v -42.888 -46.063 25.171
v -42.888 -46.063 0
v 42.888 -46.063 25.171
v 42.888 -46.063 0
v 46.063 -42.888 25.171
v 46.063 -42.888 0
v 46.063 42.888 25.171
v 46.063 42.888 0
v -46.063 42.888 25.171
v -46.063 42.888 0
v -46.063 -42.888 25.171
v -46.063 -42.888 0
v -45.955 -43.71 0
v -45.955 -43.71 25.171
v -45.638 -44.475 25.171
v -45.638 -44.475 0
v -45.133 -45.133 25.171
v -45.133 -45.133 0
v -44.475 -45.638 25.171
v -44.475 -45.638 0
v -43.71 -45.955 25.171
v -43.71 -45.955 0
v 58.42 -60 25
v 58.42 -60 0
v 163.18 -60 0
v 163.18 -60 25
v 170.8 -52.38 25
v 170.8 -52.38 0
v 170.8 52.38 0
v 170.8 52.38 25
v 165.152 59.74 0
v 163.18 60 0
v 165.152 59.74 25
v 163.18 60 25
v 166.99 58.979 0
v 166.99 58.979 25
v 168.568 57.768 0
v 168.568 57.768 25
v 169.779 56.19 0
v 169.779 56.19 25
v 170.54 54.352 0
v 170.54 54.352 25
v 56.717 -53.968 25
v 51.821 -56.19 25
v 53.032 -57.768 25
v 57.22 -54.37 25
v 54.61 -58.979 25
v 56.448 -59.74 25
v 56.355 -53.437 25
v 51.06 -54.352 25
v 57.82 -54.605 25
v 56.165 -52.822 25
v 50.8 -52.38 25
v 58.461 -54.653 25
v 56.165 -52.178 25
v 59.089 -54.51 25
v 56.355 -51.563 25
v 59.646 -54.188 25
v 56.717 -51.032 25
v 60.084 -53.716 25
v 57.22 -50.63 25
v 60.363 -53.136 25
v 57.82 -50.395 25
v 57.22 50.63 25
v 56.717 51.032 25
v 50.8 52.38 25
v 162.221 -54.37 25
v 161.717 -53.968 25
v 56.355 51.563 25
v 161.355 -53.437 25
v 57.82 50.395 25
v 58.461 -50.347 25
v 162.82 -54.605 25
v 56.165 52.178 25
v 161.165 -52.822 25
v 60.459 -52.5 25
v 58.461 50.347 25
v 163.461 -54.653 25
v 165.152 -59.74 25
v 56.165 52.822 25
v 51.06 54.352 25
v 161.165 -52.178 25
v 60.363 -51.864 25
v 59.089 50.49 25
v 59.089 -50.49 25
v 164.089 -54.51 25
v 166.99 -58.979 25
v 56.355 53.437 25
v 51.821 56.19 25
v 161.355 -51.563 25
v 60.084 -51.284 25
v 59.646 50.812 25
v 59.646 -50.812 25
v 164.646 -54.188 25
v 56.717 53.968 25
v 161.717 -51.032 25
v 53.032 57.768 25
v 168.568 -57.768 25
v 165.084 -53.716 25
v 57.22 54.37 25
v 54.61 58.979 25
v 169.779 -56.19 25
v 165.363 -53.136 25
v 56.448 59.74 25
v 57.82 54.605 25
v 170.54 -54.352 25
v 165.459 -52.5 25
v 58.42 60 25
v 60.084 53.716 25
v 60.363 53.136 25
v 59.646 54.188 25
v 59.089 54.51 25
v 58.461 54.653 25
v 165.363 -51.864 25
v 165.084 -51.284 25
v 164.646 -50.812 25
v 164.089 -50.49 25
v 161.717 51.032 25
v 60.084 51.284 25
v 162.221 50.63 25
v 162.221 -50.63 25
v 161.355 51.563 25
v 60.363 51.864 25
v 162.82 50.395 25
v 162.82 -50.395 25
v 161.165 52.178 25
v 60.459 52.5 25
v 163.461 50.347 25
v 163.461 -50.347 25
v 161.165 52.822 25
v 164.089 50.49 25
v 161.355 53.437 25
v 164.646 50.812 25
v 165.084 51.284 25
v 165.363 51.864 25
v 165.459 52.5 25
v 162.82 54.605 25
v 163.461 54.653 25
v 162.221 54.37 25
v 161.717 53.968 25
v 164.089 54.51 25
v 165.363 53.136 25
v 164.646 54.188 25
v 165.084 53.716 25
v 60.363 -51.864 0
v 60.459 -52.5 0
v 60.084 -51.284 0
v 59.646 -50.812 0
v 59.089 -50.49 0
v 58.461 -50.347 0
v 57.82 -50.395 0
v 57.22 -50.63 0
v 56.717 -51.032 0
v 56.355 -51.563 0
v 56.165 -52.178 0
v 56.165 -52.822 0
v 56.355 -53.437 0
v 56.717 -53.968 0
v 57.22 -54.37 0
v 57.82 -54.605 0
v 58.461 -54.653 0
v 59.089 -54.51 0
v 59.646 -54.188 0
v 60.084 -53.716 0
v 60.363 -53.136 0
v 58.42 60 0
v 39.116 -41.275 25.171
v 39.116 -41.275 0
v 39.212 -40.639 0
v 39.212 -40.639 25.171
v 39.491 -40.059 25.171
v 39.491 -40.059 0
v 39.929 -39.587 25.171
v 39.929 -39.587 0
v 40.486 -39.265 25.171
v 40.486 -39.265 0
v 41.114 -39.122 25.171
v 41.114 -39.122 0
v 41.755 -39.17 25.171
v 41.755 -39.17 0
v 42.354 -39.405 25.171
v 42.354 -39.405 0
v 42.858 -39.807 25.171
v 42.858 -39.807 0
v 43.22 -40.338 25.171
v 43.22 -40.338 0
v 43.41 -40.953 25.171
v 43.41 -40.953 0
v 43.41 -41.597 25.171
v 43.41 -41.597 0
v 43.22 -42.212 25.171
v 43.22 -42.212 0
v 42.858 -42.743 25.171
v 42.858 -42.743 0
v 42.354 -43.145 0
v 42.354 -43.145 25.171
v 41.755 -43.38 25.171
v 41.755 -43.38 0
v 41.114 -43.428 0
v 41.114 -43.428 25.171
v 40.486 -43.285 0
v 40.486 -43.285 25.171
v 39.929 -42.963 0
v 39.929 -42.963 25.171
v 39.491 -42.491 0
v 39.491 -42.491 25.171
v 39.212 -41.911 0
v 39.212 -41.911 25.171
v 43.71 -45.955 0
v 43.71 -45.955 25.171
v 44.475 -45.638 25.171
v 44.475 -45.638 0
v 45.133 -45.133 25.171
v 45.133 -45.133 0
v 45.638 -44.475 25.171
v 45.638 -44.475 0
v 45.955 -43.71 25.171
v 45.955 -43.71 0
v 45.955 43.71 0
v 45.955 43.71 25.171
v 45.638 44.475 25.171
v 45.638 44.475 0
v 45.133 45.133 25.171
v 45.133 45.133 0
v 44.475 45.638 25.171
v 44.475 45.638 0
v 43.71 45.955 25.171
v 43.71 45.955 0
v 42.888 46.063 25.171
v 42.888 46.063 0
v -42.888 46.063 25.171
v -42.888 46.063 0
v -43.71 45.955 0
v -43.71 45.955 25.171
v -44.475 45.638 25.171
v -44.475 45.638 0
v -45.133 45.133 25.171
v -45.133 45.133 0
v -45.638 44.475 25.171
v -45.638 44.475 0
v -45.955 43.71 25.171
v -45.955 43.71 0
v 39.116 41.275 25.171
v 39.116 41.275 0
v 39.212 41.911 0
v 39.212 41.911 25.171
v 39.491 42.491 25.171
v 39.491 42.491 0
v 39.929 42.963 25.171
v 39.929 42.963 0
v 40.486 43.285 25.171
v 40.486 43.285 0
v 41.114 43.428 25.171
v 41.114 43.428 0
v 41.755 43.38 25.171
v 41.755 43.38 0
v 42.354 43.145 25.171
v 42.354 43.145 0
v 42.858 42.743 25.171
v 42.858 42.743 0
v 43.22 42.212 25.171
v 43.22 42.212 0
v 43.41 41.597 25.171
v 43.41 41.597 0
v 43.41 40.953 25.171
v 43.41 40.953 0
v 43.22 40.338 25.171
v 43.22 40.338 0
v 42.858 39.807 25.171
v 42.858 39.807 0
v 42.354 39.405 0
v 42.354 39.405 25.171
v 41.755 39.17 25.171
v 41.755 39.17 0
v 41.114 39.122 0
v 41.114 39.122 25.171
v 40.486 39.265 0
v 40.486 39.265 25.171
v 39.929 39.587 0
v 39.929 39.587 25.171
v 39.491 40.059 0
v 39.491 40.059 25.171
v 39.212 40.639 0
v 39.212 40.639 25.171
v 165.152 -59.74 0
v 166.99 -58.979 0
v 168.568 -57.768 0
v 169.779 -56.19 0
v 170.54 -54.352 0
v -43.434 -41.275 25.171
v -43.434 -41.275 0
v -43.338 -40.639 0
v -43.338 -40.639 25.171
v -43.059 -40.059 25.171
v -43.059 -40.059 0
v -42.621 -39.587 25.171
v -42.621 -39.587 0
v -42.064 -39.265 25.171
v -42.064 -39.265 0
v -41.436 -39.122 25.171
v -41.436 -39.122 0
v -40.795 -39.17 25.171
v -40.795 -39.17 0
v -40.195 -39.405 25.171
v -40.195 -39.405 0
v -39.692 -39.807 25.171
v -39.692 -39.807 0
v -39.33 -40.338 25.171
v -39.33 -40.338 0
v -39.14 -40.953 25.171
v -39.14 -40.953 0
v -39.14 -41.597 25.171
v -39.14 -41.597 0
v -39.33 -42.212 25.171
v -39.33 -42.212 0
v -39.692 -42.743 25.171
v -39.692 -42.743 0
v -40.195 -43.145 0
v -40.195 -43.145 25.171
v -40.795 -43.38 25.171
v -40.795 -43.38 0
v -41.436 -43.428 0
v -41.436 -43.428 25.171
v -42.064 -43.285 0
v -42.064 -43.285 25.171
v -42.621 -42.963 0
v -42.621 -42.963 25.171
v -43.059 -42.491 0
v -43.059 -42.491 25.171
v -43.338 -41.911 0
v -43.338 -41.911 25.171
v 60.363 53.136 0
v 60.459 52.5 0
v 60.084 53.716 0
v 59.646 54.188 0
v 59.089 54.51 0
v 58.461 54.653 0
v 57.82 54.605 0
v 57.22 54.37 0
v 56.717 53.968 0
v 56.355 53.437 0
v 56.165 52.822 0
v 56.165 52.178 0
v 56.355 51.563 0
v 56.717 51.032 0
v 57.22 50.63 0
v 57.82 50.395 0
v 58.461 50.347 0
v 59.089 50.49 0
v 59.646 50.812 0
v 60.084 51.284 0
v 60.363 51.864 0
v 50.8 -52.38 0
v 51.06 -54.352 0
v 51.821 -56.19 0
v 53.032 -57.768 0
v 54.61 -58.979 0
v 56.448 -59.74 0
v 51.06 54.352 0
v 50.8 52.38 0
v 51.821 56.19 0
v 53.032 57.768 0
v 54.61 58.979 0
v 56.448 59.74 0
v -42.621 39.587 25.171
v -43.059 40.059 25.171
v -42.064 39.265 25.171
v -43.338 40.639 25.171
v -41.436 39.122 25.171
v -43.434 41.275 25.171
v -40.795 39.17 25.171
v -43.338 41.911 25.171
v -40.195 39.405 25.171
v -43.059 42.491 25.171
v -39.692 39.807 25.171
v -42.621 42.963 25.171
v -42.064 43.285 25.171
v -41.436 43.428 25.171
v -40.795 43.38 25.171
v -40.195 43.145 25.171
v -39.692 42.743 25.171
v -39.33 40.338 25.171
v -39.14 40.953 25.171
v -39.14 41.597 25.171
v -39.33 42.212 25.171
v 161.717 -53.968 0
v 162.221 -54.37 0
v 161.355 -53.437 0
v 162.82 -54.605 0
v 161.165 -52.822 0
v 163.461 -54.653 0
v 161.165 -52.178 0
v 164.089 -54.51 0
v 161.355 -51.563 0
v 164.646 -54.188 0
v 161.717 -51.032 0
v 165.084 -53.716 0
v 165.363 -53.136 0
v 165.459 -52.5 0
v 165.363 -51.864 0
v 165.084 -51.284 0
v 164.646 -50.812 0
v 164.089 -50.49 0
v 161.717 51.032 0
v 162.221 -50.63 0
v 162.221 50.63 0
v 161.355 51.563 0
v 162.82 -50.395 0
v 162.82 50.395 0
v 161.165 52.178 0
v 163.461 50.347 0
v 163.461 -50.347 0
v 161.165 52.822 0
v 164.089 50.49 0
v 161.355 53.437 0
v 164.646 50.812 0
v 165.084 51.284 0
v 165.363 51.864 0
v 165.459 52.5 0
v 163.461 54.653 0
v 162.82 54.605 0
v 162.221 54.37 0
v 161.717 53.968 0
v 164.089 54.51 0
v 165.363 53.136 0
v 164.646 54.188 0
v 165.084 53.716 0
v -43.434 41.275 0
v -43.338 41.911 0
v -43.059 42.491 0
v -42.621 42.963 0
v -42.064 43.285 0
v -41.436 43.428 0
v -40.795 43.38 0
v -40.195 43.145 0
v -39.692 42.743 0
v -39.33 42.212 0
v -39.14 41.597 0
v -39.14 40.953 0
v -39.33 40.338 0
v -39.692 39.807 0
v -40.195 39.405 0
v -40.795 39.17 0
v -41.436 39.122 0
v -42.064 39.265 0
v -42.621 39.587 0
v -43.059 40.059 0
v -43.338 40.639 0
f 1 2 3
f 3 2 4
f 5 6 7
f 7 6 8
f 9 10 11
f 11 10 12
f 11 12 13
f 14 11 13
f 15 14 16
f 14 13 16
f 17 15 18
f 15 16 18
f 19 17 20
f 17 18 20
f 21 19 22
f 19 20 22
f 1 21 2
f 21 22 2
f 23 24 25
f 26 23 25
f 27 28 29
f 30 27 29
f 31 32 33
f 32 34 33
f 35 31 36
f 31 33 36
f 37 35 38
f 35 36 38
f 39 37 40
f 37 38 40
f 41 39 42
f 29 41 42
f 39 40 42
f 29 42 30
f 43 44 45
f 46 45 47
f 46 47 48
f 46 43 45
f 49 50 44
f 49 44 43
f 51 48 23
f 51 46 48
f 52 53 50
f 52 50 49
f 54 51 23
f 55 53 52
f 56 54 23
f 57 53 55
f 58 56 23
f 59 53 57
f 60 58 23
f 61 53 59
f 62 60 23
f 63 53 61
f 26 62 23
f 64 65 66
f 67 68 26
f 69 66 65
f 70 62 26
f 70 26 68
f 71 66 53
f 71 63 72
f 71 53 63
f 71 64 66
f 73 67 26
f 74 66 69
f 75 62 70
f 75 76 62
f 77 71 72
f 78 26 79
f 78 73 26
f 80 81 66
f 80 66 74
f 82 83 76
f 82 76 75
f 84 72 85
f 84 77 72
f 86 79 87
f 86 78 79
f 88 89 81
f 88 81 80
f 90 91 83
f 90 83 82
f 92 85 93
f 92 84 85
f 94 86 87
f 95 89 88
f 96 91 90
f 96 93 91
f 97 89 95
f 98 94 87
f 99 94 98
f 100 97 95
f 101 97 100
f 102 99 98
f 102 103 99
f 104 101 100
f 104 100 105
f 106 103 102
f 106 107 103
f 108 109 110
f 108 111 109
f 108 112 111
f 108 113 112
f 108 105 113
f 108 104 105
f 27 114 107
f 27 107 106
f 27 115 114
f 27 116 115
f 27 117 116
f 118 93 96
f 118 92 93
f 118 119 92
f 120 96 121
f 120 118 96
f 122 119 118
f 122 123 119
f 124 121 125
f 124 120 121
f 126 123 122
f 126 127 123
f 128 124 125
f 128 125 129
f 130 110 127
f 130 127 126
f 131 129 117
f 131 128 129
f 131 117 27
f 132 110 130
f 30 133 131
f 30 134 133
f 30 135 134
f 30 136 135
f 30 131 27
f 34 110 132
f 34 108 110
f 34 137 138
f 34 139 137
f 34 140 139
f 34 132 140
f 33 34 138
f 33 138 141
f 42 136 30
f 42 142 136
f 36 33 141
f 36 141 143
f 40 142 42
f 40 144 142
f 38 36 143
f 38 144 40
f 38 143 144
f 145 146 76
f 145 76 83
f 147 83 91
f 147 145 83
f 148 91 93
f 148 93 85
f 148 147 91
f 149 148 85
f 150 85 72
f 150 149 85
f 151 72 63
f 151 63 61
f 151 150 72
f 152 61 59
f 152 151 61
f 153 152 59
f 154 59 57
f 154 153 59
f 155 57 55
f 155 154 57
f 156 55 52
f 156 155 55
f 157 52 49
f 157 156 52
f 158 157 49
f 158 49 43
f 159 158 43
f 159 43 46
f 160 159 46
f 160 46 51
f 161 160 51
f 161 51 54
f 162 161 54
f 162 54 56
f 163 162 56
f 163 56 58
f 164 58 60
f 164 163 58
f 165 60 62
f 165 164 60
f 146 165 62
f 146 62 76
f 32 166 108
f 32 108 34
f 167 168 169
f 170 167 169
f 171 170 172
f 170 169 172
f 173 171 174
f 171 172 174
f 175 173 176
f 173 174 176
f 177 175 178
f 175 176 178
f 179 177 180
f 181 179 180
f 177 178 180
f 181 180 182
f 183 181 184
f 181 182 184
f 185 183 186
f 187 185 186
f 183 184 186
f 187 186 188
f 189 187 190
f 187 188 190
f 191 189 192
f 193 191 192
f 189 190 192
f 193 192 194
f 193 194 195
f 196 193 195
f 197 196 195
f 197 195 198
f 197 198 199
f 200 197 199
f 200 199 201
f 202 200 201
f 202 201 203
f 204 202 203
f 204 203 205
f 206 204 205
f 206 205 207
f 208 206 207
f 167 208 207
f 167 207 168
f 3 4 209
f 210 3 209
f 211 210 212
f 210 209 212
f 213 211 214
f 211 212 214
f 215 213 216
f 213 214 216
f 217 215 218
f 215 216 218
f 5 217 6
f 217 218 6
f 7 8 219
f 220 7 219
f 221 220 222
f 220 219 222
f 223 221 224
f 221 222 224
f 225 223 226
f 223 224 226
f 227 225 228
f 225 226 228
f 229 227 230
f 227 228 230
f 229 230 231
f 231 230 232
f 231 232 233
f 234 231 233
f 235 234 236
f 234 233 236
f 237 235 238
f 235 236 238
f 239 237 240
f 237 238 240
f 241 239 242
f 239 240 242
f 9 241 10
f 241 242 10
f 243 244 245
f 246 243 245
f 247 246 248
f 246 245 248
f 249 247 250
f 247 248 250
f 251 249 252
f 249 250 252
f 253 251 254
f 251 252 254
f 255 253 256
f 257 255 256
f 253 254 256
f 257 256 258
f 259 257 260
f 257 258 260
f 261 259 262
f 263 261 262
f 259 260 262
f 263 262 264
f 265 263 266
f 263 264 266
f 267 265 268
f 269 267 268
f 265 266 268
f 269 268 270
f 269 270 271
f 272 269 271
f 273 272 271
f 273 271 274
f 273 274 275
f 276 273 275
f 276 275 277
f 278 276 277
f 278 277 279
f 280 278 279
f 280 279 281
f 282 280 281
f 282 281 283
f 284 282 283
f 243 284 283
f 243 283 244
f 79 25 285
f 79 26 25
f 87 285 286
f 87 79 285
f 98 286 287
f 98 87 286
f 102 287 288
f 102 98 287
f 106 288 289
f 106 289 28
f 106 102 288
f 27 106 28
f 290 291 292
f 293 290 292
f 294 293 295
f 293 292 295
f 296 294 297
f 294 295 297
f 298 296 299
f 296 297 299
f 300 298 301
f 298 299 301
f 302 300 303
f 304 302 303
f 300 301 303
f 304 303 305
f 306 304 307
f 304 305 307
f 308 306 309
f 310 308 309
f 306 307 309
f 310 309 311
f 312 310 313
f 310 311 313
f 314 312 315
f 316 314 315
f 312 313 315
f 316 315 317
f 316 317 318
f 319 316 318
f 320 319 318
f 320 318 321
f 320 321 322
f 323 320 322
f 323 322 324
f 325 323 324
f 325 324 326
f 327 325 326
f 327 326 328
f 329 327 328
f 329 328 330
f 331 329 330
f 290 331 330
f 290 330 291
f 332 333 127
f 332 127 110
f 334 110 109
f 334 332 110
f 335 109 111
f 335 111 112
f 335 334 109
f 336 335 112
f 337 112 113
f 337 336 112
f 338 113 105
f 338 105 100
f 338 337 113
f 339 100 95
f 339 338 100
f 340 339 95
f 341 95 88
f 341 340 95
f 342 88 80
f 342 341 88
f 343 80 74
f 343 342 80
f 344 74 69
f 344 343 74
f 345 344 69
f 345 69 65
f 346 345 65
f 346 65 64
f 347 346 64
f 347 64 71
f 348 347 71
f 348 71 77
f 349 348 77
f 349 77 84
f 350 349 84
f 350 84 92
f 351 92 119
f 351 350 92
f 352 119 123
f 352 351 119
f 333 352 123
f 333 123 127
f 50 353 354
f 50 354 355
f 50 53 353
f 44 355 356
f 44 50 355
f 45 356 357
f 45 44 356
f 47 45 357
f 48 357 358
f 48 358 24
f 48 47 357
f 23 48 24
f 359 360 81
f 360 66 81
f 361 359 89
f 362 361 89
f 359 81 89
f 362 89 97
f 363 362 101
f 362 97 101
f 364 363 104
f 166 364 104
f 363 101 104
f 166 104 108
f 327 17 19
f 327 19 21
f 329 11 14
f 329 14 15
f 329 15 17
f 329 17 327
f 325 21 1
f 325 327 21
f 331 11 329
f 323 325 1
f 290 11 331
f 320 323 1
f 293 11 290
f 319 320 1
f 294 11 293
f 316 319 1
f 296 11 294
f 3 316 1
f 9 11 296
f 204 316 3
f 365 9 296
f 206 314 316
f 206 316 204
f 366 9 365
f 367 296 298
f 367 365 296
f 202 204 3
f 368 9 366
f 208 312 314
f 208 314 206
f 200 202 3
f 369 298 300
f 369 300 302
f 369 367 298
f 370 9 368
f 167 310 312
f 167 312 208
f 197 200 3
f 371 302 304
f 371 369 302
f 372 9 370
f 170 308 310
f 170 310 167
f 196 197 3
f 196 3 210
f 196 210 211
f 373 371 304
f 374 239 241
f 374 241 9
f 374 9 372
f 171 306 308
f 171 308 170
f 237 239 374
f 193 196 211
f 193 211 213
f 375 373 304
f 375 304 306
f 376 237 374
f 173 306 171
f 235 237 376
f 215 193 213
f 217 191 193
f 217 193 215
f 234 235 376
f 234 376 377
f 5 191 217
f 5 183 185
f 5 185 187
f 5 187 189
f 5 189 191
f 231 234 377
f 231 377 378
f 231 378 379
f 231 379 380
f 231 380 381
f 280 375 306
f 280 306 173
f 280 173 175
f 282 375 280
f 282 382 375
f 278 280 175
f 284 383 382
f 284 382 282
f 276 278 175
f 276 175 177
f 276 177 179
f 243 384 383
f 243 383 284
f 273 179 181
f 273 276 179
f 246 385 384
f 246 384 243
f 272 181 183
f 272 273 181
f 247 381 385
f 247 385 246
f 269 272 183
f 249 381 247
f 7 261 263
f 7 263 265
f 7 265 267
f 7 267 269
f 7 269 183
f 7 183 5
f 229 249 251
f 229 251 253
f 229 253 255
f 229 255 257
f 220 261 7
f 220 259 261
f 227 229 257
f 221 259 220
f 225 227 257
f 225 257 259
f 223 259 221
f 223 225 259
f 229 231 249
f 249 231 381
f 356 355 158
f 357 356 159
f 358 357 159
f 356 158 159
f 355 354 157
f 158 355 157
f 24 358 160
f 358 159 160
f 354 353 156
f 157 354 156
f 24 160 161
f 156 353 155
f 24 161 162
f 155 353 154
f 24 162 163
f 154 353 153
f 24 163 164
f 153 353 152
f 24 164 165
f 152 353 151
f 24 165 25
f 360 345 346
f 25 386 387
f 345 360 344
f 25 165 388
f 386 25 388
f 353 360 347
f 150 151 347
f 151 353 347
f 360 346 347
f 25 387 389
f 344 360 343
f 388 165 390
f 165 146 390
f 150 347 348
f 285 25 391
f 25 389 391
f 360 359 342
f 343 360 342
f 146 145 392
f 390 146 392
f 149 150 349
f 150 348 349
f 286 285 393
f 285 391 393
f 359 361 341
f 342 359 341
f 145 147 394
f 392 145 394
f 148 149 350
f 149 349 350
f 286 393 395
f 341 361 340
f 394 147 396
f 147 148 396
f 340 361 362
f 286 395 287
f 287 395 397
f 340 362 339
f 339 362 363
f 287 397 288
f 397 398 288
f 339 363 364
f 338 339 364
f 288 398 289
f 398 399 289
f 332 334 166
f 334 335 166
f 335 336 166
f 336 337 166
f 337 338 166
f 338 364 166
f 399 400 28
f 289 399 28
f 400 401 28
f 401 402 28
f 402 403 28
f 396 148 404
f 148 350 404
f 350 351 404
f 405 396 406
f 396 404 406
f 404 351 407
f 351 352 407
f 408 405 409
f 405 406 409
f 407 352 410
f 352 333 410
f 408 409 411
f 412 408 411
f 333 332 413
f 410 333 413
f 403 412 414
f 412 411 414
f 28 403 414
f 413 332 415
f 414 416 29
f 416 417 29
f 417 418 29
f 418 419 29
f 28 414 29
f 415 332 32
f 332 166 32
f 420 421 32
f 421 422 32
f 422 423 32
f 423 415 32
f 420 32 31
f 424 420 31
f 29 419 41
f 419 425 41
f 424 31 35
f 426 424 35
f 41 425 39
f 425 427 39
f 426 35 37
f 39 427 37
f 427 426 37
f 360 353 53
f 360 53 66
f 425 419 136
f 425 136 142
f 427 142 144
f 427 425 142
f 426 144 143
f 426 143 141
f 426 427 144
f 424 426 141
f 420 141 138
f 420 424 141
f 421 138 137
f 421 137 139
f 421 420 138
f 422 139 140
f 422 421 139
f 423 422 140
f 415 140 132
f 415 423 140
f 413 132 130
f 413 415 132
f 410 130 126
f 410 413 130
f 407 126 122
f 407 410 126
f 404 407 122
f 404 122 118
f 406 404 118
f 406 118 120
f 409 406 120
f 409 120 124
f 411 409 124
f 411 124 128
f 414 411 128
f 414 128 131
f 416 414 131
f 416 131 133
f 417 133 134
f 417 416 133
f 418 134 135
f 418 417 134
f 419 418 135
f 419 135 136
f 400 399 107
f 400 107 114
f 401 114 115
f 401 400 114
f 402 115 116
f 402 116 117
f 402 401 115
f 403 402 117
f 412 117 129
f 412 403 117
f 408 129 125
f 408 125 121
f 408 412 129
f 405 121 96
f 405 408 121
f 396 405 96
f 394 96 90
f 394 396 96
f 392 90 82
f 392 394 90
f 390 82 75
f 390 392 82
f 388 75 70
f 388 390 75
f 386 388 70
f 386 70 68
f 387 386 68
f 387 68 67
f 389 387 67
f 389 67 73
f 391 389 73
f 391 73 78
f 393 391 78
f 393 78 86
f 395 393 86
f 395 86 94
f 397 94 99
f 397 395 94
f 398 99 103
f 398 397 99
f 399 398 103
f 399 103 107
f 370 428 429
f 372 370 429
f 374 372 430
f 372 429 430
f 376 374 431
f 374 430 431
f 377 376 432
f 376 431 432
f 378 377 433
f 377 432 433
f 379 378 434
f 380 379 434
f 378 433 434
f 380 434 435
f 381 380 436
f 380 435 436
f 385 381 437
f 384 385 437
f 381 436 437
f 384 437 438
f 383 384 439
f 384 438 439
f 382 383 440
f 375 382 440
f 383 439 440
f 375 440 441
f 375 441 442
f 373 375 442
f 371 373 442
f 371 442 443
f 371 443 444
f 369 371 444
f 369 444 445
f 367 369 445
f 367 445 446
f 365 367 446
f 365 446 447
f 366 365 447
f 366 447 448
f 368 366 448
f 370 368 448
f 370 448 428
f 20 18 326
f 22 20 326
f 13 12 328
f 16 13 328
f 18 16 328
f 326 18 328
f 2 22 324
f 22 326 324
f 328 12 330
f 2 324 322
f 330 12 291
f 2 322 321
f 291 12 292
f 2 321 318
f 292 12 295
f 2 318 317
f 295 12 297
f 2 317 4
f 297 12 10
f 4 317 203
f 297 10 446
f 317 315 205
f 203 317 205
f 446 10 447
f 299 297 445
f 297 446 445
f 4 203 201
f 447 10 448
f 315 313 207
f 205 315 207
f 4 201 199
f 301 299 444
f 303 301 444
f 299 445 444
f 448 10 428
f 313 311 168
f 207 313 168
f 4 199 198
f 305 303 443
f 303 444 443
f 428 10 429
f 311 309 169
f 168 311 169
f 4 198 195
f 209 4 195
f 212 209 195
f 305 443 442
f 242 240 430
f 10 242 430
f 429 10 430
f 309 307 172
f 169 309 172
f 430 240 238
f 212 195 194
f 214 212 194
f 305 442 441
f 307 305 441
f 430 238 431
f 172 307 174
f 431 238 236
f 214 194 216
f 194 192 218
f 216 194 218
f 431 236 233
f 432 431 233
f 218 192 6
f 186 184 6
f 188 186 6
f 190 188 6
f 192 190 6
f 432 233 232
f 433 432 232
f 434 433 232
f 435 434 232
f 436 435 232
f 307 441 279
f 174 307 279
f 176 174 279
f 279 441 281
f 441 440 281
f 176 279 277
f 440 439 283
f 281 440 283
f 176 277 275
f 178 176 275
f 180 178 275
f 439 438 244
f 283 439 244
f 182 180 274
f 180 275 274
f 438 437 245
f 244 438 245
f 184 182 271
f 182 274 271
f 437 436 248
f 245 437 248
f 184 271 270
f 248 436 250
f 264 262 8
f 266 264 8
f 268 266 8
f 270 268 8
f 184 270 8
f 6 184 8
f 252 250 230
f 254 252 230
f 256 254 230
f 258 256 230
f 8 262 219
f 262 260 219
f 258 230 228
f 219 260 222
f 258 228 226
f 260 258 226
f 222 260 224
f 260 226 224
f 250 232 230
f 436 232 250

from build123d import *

# Parameters (mm, degrees)
F1_DEPTH = 25.1714
F3_D     = 4.318
F4_W     = 120
F4_H     = 120
F4_R     = 2.159
F5_DEPTH = 25
F6_R     = 7.62


with BuildPart() as f1:
    # F0 (on Top) → F1 (new body)
    with BuildSketch(Plane.XY):
        with BuildLine():
            Line((42.8879, 46.0629), (-42.8879, 46.0629))
            ThreePointArc((-42.8879, 46.0629), (-45.132964, 45.132964), (-46.0629, 42.8879))
            Line((-46.0629, 42.8879), (-46.0629, -42.8879))
            ThreePointArc((-46.0629, -42.8879), (-45.132964, -45.132964), (-42.8879, -46.0629))
            Line((-42.8879, -46.0629), (42.8879, -46.0629))
            ThreePointArc((42.8879, -46.0629), (45.132964, -45.132964), (46.0629, -42.8879))
            Line((46.0629, -42.8879), (46.0629, 42.8879))
            ThreePointArc((46.0629, 42.8879), (45.132964, 45.132964), (42.8879, 46.0629))
        make_face()
    extrude(amount=F1_DEPTH)

    # F3 (through all)
    with Locations(Plane.XY.offset(25.1714)):
        with Locations((-41.275, 41.275), (41.275, 41.275), (-41.275, -41.275), (41.275, -41.275)):
            Hole(F3_D / 2)


with BuildPart() as f5:
    # F4 (on Top) → F5 (new body)
    with BuildSketch(Plane.XY):
        with Locations((110.8, 0)):
            Rectangle(F4_W, F4_H)
        with Locations((58.3, -52.5)):
            Circle(F4_R, mode=Mode.SUBTRACT)
        with Locations((163.3, -52.5)):
            Circle(F4_R, mode=Mode.SUBTRACT)
        with Locations((58.3, 52.5)):
            Circle(F4_R, mode=Mode.SUBTRACT)
        with Locations((163.3, 52.5)):
            Circle(F4_R, mode=Mode.SUBTRACT)
    extrude(amount=F5_DEPTH)

    # F6
    f6_edges = [f5.edges().sort_by_distance(p)[0] for p in [
        (50.8, -60, 12.5),
        (170.8, -60, 12.5),
        (170.8, 60, 12.5),
        (50.8, 60, 12.5),
    ]]
    fillet(f6_edges, radius=F6_R)


solid = Compound([f1.part, f5.part])
